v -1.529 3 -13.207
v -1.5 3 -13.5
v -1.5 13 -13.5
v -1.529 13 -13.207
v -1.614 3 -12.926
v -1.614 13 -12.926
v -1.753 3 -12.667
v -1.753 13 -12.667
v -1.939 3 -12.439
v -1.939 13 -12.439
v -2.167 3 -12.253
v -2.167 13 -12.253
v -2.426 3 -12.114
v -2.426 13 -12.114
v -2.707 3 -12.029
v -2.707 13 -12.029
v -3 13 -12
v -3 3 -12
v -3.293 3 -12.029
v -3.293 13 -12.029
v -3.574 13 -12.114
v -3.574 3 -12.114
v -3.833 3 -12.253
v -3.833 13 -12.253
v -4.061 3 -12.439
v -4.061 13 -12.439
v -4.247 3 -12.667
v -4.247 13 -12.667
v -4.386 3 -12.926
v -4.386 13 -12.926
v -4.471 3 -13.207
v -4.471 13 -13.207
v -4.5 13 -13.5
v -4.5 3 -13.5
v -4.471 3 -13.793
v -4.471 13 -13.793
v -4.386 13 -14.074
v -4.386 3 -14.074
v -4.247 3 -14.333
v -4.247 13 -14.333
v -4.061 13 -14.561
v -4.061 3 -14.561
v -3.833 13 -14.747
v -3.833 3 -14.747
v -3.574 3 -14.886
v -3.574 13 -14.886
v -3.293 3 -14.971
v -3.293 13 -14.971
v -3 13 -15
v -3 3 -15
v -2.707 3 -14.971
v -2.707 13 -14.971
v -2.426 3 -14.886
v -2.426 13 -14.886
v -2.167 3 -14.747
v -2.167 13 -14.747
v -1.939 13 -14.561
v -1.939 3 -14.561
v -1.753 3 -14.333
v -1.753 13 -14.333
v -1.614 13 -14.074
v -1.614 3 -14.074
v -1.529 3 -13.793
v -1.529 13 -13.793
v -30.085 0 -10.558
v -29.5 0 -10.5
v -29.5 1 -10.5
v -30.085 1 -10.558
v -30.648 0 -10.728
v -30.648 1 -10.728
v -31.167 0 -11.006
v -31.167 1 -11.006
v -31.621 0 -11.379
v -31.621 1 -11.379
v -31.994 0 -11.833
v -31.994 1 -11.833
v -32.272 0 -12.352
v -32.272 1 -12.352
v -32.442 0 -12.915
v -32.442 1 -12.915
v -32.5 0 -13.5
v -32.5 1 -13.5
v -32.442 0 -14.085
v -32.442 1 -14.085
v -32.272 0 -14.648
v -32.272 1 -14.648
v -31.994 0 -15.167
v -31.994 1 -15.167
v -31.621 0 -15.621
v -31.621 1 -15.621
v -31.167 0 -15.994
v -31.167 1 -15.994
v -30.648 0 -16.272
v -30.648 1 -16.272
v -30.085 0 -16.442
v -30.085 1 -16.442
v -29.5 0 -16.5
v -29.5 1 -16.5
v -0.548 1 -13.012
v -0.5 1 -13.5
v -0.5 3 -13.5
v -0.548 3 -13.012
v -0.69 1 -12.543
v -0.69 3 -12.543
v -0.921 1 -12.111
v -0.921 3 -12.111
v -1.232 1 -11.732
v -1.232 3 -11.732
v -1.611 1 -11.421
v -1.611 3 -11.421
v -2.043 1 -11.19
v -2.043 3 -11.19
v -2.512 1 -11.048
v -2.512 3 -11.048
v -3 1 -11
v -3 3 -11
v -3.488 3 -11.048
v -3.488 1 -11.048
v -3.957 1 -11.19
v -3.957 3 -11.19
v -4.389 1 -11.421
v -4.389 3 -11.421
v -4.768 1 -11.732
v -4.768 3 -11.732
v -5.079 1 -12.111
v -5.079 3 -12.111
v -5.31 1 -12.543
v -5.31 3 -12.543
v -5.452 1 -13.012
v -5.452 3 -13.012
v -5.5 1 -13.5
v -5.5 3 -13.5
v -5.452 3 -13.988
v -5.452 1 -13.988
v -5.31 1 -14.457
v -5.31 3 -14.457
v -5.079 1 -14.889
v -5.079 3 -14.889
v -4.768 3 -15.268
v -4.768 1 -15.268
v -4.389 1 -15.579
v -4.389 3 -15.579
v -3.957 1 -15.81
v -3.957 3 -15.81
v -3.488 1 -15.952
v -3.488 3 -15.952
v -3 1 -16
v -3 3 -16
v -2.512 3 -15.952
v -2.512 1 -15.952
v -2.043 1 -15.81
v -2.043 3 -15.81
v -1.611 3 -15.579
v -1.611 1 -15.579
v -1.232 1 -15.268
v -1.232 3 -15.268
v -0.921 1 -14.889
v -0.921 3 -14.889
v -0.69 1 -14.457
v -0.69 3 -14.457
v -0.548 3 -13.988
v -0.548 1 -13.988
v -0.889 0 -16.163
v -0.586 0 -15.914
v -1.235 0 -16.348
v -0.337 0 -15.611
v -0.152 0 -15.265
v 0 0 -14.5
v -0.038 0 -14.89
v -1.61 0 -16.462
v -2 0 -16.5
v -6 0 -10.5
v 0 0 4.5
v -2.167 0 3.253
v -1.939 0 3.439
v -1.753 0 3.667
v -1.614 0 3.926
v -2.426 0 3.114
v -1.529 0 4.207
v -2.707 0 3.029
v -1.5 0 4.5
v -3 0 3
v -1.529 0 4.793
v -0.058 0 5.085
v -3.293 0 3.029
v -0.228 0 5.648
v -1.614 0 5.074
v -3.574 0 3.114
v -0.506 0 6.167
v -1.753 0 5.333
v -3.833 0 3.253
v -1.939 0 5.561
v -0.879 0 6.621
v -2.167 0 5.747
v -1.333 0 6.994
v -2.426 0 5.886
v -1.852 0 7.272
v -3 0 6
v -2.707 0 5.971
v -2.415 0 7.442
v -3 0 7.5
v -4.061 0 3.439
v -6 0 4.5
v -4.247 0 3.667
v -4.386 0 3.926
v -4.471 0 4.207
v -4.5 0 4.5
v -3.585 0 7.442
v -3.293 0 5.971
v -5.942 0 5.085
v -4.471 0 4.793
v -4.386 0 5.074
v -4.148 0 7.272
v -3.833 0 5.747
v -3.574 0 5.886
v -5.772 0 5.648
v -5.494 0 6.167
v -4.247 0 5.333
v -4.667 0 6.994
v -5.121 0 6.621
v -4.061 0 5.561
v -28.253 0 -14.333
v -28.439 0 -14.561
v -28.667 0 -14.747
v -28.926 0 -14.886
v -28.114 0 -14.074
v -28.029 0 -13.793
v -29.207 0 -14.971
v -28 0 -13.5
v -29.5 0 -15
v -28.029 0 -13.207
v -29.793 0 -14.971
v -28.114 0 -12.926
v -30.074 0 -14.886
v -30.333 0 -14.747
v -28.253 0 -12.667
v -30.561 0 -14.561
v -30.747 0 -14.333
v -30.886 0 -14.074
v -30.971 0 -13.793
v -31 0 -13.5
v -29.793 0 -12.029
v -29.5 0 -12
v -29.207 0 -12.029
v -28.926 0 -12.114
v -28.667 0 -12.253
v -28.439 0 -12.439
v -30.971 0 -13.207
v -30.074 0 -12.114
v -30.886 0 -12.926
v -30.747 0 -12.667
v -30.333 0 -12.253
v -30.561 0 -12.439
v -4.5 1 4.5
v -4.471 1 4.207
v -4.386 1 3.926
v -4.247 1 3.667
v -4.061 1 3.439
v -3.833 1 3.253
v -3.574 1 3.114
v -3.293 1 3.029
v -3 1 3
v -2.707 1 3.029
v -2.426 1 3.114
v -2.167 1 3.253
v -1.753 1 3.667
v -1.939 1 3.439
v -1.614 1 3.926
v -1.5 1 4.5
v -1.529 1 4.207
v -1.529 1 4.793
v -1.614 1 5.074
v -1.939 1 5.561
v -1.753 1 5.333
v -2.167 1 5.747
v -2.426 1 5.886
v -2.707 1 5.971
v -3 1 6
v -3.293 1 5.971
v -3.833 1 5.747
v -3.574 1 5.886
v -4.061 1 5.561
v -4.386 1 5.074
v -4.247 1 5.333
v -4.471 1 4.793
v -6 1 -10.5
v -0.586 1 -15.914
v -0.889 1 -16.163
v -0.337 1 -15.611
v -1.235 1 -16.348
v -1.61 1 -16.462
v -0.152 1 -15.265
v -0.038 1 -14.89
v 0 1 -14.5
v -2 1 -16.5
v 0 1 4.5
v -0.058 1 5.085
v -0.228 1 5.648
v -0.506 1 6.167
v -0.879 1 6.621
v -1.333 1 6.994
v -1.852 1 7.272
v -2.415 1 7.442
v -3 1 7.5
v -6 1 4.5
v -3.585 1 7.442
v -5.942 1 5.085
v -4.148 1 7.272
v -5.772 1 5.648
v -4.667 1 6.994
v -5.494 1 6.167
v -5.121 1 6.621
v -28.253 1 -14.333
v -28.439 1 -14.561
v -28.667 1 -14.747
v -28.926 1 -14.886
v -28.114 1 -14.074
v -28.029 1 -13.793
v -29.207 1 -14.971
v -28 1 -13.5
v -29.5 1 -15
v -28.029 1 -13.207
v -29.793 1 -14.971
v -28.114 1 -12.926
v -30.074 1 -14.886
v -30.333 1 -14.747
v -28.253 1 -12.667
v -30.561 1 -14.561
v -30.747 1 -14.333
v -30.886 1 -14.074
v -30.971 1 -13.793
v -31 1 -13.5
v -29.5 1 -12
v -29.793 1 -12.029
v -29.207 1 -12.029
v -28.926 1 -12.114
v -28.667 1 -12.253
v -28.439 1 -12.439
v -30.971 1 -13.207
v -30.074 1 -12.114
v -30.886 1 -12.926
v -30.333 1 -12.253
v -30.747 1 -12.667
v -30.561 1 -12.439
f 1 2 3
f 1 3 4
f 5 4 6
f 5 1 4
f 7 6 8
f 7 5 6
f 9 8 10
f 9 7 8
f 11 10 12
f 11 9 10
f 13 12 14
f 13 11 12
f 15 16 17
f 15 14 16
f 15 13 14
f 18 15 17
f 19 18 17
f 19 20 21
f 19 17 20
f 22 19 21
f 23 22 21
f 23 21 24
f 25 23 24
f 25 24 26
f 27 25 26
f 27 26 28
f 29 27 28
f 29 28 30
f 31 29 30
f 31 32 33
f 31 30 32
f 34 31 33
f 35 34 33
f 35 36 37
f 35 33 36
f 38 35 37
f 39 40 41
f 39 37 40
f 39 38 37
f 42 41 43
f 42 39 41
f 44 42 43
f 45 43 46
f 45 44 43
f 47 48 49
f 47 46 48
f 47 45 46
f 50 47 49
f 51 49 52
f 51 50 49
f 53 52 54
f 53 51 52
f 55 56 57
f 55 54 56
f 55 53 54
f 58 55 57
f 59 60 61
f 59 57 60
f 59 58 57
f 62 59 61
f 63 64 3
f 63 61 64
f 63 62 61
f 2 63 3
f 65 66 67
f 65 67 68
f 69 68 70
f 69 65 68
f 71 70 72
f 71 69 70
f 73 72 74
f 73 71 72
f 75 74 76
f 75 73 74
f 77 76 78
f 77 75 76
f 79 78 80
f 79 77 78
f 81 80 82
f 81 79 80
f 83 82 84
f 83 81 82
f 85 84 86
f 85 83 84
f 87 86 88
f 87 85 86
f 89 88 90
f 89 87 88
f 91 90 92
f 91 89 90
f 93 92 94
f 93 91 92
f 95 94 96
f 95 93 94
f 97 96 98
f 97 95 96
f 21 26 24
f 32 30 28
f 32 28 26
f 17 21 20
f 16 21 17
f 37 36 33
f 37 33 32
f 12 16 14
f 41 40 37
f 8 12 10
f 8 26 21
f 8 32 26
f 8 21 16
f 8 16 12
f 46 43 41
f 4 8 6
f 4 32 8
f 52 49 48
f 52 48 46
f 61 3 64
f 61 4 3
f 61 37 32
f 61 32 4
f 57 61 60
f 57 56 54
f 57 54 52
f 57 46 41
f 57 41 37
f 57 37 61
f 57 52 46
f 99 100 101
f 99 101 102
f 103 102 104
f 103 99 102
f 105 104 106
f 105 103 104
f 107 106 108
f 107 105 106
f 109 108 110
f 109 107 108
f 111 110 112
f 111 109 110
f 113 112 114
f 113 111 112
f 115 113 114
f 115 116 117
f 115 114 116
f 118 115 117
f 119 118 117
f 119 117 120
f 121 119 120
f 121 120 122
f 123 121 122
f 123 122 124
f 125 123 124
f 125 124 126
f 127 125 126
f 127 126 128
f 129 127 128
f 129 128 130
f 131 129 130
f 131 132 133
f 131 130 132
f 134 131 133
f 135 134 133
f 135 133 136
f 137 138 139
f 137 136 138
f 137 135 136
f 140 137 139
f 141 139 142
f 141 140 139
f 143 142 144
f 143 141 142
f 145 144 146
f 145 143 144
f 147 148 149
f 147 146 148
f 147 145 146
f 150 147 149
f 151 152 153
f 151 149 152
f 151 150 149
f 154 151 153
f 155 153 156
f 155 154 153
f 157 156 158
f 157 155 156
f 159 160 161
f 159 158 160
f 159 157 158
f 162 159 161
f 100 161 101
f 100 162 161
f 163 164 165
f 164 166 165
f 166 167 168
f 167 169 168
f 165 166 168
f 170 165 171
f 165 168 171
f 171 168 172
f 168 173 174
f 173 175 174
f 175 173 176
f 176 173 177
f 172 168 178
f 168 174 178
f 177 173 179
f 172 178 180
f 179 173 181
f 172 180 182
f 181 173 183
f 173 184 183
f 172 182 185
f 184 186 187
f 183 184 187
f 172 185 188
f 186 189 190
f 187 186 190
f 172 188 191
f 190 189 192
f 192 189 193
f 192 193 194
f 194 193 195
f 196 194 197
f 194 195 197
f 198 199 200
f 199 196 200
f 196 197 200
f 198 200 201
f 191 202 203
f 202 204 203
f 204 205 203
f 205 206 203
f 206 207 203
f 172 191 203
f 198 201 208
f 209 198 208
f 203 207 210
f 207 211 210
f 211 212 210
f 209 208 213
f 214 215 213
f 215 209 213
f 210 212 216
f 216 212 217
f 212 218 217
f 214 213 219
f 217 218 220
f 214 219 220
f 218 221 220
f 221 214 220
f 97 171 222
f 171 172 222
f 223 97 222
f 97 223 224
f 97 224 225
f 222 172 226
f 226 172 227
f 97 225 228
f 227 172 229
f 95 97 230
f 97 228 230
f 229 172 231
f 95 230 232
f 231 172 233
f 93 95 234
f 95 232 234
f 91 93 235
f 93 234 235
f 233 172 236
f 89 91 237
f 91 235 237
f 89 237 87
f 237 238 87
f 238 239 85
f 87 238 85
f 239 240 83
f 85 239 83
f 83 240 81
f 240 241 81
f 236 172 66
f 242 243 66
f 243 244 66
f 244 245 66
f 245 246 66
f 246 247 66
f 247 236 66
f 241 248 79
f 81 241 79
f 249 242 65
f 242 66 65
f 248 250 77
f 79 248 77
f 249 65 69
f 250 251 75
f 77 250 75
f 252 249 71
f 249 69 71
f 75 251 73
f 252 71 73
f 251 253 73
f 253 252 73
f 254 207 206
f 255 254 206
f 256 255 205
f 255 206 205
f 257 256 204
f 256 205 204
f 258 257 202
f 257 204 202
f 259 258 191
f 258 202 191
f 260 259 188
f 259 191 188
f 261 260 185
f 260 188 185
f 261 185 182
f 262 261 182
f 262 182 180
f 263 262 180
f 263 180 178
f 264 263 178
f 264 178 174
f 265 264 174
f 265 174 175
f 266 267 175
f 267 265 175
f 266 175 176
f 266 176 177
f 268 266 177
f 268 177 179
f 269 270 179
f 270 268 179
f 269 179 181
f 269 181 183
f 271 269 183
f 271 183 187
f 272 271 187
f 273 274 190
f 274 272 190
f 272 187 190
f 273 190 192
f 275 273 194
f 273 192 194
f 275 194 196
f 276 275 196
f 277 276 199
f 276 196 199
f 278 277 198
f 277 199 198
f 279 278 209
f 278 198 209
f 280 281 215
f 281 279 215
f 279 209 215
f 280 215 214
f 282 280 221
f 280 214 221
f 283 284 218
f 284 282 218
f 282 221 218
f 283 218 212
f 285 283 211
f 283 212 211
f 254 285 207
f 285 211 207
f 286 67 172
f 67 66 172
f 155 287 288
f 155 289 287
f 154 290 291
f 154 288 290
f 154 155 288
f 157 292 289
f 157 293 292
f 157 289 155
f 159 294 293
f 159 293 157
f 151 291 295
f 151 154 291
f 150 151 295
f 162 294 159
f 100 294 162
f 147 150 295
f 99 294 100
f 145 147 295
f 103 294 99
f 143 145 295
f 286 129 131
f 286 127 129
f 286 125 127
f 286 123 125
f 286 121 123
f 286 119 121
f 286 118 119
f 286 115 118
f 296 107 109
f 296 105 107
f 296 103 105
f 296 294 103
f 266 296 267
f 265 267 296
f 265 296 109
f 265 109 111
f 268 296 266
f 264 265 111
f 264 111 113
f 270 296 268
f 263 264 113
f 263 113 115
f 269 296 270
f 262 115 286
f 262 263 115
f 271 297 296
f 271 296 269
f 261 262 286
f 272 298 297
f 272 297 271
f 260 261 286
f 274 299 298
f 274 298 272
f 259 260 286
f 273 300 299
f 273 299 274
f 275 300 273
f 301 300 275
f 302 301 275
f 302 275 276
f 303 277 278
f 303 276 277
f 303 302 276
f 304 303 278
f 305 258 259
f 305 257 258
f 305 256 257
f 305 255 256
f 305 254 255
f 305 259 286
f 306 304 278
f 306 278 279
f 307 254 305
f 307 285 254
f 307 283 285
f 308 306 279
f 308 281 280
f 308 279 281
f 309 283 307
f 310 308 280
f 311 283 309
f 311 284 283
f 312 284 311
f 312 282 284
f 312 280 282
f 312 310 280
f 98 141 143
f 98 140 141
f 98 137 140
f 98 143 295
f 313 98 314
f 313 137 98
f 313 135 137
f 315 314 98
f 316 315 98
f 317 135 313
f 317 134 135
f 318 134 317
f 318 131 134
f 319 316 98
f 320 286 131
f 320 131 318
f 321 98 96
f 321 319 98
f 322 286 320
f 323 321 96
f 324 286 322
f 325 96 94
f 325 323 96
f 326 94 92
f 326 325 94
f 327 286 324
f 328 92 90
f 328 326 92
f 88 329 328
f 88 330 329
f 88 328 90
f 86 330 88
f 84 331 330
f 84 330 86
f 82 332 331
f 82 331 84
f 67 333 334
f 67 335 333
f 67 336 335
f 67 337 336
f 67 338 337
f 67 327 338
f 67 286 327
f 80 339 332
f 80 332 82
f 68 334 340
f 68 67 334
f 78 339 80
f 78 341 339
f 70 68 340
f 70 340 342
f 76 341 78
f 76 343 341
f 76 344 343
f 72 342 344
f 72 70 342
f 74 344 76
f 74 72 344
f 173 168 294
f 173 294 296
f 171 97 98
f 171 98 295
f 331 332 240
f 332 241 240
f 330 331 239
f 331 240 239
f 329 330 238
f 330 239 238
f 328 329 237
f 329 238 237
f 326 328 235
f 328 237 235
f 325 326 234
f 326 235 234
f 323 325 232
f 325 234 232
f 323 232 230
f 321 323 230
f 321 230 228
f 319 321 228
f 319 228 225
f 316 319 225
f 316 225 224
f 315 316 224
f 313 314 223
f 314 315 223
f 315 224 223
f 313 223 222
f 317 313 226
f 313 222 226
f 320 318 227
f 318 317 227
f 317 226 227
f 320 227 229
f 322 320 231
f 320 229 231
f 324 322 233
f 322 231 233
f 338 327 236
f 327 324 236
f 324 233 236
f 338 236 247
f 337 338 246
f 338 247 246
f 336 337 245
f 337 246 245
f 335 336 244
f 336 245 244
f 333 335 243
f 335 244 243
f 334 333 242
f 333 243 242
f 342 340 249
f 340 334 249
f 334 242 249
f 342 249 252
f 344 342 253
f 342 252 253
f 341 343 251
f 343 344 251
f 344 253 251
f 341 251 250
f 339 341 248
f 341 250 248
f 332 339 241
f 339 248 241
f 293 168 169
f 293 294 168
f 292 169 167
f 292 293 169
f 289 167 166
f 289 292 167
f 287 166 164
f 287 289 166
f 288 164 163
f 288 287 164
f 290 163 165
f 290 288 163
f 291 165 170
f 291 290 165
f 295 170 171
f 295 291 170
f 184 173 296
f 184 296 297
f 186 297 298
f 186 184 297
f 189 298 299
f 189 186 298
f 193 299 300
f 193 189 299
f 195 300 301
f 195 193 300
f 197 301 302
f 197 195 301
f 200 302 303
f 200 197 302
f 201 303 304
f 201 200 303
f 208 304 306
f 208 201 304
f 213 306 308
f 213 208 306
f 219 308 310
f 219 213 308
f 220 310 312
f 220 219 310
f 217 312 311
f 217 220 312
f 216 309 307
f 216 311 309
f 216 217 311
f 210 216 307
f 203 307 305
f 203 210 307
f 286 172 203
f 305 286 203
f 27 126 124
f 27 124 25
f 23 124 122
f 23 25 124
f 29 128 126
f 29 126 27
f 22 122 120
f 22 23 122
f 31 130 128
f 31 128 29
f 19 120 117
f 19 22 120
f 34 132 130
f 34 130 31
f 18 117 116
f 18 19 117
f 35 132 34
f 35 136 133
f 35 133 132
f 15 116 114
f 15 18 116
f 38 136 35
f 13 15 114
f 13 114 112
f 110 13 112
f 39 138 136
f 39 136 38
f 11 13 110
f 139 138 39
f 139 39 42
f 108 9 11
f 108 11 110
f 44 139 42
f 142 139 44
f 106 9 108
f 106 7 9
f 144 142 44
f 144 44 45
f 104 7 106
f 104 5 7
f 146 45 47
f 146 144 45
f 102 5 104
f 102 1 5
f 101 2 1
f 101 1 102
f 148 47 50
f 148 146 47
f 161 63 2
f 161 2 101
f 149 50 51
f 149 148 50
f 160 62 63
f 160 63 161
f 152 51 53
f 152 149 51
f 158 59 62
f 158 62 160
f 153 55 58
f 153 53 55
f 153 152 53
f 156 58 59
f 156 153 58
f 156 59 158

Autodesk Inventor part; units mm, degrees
ref_plane "YZ Plane" through (0, 0, 0) normal (1, 0, 0) x (0, 1, 0)
ref_plane "XZ Plane" through (0, 0, 0) normal (0, 1, 0) x (-1, 0, 0)
ref_plane "XY Plane" through (0, 0, 0) normal (0, 0, 1) x (1, 0, 0)
sketch "Sketch1" plane through (0, 0, 0) normal (0, 1, 0) x (-1, 0, 0)
  circle A0 centre (3, -13.5) radius 1.5
  circle A1 centre (29.5, -13.5) radius 1.5
  circle A2 centre (29.5, -13.5) radius 3
  circle A3 centre (3, 4.5) radius 1.5
  circle A4 centre (3, 4.5) radius 3
  line L0 (29.5, -16.5) -> (0, -16.5)
  line L1 (0, -16.5) -> (0, 4.5)
  line L2 (29.5, -10.5) -> (6, -10.5)
  line L3 (6, -10.5) -> (6, 4.5)
  point P0 (0, 0)
  dimension "d24" = 3
  dimension "d57" = 3
  dimension "d58" = 6
  dimension "d59" = 3
  dimension "d60" = 6
ref_plane "Work Plane1" through (0, 1, 0) normal (0, 1, 0) x (1, 0, 0)
sketch "Sketch2" plane through (0, 1, 0) normal (0, 1, 0) x (1, 0, 0)
  line L0 (0, -4.5) -> (0, 14.5) projected
  circle A0 centre (-3, 13.5) radius 1.5 projected
  circle A1 centre (-3, 13.5) radius 1.5
  circle A2 centre (-3, 13.5) radius 2.5
  point P0 (0, 0)
  point P1 (-6, 10.5)
  dimension "d36" = 5
extrude "Extrusion5" add sketch "Sketch2" along normal blind 2
extrude "Extrusion6" add sketch "Sketch2" along normal blind 12 and the other way blind 1 contours A0
thread "Thread2" size "M3x0.5" class "6g" standard "ANSI Metric M Profile" length 5
extrude "Extrusion8" add sketch "Sketch1" along normal blind 1
fillet "Fillet3" radius 2 1 edges at (0, 0.5, -16.5)
properties part number "linkToActuator2"
